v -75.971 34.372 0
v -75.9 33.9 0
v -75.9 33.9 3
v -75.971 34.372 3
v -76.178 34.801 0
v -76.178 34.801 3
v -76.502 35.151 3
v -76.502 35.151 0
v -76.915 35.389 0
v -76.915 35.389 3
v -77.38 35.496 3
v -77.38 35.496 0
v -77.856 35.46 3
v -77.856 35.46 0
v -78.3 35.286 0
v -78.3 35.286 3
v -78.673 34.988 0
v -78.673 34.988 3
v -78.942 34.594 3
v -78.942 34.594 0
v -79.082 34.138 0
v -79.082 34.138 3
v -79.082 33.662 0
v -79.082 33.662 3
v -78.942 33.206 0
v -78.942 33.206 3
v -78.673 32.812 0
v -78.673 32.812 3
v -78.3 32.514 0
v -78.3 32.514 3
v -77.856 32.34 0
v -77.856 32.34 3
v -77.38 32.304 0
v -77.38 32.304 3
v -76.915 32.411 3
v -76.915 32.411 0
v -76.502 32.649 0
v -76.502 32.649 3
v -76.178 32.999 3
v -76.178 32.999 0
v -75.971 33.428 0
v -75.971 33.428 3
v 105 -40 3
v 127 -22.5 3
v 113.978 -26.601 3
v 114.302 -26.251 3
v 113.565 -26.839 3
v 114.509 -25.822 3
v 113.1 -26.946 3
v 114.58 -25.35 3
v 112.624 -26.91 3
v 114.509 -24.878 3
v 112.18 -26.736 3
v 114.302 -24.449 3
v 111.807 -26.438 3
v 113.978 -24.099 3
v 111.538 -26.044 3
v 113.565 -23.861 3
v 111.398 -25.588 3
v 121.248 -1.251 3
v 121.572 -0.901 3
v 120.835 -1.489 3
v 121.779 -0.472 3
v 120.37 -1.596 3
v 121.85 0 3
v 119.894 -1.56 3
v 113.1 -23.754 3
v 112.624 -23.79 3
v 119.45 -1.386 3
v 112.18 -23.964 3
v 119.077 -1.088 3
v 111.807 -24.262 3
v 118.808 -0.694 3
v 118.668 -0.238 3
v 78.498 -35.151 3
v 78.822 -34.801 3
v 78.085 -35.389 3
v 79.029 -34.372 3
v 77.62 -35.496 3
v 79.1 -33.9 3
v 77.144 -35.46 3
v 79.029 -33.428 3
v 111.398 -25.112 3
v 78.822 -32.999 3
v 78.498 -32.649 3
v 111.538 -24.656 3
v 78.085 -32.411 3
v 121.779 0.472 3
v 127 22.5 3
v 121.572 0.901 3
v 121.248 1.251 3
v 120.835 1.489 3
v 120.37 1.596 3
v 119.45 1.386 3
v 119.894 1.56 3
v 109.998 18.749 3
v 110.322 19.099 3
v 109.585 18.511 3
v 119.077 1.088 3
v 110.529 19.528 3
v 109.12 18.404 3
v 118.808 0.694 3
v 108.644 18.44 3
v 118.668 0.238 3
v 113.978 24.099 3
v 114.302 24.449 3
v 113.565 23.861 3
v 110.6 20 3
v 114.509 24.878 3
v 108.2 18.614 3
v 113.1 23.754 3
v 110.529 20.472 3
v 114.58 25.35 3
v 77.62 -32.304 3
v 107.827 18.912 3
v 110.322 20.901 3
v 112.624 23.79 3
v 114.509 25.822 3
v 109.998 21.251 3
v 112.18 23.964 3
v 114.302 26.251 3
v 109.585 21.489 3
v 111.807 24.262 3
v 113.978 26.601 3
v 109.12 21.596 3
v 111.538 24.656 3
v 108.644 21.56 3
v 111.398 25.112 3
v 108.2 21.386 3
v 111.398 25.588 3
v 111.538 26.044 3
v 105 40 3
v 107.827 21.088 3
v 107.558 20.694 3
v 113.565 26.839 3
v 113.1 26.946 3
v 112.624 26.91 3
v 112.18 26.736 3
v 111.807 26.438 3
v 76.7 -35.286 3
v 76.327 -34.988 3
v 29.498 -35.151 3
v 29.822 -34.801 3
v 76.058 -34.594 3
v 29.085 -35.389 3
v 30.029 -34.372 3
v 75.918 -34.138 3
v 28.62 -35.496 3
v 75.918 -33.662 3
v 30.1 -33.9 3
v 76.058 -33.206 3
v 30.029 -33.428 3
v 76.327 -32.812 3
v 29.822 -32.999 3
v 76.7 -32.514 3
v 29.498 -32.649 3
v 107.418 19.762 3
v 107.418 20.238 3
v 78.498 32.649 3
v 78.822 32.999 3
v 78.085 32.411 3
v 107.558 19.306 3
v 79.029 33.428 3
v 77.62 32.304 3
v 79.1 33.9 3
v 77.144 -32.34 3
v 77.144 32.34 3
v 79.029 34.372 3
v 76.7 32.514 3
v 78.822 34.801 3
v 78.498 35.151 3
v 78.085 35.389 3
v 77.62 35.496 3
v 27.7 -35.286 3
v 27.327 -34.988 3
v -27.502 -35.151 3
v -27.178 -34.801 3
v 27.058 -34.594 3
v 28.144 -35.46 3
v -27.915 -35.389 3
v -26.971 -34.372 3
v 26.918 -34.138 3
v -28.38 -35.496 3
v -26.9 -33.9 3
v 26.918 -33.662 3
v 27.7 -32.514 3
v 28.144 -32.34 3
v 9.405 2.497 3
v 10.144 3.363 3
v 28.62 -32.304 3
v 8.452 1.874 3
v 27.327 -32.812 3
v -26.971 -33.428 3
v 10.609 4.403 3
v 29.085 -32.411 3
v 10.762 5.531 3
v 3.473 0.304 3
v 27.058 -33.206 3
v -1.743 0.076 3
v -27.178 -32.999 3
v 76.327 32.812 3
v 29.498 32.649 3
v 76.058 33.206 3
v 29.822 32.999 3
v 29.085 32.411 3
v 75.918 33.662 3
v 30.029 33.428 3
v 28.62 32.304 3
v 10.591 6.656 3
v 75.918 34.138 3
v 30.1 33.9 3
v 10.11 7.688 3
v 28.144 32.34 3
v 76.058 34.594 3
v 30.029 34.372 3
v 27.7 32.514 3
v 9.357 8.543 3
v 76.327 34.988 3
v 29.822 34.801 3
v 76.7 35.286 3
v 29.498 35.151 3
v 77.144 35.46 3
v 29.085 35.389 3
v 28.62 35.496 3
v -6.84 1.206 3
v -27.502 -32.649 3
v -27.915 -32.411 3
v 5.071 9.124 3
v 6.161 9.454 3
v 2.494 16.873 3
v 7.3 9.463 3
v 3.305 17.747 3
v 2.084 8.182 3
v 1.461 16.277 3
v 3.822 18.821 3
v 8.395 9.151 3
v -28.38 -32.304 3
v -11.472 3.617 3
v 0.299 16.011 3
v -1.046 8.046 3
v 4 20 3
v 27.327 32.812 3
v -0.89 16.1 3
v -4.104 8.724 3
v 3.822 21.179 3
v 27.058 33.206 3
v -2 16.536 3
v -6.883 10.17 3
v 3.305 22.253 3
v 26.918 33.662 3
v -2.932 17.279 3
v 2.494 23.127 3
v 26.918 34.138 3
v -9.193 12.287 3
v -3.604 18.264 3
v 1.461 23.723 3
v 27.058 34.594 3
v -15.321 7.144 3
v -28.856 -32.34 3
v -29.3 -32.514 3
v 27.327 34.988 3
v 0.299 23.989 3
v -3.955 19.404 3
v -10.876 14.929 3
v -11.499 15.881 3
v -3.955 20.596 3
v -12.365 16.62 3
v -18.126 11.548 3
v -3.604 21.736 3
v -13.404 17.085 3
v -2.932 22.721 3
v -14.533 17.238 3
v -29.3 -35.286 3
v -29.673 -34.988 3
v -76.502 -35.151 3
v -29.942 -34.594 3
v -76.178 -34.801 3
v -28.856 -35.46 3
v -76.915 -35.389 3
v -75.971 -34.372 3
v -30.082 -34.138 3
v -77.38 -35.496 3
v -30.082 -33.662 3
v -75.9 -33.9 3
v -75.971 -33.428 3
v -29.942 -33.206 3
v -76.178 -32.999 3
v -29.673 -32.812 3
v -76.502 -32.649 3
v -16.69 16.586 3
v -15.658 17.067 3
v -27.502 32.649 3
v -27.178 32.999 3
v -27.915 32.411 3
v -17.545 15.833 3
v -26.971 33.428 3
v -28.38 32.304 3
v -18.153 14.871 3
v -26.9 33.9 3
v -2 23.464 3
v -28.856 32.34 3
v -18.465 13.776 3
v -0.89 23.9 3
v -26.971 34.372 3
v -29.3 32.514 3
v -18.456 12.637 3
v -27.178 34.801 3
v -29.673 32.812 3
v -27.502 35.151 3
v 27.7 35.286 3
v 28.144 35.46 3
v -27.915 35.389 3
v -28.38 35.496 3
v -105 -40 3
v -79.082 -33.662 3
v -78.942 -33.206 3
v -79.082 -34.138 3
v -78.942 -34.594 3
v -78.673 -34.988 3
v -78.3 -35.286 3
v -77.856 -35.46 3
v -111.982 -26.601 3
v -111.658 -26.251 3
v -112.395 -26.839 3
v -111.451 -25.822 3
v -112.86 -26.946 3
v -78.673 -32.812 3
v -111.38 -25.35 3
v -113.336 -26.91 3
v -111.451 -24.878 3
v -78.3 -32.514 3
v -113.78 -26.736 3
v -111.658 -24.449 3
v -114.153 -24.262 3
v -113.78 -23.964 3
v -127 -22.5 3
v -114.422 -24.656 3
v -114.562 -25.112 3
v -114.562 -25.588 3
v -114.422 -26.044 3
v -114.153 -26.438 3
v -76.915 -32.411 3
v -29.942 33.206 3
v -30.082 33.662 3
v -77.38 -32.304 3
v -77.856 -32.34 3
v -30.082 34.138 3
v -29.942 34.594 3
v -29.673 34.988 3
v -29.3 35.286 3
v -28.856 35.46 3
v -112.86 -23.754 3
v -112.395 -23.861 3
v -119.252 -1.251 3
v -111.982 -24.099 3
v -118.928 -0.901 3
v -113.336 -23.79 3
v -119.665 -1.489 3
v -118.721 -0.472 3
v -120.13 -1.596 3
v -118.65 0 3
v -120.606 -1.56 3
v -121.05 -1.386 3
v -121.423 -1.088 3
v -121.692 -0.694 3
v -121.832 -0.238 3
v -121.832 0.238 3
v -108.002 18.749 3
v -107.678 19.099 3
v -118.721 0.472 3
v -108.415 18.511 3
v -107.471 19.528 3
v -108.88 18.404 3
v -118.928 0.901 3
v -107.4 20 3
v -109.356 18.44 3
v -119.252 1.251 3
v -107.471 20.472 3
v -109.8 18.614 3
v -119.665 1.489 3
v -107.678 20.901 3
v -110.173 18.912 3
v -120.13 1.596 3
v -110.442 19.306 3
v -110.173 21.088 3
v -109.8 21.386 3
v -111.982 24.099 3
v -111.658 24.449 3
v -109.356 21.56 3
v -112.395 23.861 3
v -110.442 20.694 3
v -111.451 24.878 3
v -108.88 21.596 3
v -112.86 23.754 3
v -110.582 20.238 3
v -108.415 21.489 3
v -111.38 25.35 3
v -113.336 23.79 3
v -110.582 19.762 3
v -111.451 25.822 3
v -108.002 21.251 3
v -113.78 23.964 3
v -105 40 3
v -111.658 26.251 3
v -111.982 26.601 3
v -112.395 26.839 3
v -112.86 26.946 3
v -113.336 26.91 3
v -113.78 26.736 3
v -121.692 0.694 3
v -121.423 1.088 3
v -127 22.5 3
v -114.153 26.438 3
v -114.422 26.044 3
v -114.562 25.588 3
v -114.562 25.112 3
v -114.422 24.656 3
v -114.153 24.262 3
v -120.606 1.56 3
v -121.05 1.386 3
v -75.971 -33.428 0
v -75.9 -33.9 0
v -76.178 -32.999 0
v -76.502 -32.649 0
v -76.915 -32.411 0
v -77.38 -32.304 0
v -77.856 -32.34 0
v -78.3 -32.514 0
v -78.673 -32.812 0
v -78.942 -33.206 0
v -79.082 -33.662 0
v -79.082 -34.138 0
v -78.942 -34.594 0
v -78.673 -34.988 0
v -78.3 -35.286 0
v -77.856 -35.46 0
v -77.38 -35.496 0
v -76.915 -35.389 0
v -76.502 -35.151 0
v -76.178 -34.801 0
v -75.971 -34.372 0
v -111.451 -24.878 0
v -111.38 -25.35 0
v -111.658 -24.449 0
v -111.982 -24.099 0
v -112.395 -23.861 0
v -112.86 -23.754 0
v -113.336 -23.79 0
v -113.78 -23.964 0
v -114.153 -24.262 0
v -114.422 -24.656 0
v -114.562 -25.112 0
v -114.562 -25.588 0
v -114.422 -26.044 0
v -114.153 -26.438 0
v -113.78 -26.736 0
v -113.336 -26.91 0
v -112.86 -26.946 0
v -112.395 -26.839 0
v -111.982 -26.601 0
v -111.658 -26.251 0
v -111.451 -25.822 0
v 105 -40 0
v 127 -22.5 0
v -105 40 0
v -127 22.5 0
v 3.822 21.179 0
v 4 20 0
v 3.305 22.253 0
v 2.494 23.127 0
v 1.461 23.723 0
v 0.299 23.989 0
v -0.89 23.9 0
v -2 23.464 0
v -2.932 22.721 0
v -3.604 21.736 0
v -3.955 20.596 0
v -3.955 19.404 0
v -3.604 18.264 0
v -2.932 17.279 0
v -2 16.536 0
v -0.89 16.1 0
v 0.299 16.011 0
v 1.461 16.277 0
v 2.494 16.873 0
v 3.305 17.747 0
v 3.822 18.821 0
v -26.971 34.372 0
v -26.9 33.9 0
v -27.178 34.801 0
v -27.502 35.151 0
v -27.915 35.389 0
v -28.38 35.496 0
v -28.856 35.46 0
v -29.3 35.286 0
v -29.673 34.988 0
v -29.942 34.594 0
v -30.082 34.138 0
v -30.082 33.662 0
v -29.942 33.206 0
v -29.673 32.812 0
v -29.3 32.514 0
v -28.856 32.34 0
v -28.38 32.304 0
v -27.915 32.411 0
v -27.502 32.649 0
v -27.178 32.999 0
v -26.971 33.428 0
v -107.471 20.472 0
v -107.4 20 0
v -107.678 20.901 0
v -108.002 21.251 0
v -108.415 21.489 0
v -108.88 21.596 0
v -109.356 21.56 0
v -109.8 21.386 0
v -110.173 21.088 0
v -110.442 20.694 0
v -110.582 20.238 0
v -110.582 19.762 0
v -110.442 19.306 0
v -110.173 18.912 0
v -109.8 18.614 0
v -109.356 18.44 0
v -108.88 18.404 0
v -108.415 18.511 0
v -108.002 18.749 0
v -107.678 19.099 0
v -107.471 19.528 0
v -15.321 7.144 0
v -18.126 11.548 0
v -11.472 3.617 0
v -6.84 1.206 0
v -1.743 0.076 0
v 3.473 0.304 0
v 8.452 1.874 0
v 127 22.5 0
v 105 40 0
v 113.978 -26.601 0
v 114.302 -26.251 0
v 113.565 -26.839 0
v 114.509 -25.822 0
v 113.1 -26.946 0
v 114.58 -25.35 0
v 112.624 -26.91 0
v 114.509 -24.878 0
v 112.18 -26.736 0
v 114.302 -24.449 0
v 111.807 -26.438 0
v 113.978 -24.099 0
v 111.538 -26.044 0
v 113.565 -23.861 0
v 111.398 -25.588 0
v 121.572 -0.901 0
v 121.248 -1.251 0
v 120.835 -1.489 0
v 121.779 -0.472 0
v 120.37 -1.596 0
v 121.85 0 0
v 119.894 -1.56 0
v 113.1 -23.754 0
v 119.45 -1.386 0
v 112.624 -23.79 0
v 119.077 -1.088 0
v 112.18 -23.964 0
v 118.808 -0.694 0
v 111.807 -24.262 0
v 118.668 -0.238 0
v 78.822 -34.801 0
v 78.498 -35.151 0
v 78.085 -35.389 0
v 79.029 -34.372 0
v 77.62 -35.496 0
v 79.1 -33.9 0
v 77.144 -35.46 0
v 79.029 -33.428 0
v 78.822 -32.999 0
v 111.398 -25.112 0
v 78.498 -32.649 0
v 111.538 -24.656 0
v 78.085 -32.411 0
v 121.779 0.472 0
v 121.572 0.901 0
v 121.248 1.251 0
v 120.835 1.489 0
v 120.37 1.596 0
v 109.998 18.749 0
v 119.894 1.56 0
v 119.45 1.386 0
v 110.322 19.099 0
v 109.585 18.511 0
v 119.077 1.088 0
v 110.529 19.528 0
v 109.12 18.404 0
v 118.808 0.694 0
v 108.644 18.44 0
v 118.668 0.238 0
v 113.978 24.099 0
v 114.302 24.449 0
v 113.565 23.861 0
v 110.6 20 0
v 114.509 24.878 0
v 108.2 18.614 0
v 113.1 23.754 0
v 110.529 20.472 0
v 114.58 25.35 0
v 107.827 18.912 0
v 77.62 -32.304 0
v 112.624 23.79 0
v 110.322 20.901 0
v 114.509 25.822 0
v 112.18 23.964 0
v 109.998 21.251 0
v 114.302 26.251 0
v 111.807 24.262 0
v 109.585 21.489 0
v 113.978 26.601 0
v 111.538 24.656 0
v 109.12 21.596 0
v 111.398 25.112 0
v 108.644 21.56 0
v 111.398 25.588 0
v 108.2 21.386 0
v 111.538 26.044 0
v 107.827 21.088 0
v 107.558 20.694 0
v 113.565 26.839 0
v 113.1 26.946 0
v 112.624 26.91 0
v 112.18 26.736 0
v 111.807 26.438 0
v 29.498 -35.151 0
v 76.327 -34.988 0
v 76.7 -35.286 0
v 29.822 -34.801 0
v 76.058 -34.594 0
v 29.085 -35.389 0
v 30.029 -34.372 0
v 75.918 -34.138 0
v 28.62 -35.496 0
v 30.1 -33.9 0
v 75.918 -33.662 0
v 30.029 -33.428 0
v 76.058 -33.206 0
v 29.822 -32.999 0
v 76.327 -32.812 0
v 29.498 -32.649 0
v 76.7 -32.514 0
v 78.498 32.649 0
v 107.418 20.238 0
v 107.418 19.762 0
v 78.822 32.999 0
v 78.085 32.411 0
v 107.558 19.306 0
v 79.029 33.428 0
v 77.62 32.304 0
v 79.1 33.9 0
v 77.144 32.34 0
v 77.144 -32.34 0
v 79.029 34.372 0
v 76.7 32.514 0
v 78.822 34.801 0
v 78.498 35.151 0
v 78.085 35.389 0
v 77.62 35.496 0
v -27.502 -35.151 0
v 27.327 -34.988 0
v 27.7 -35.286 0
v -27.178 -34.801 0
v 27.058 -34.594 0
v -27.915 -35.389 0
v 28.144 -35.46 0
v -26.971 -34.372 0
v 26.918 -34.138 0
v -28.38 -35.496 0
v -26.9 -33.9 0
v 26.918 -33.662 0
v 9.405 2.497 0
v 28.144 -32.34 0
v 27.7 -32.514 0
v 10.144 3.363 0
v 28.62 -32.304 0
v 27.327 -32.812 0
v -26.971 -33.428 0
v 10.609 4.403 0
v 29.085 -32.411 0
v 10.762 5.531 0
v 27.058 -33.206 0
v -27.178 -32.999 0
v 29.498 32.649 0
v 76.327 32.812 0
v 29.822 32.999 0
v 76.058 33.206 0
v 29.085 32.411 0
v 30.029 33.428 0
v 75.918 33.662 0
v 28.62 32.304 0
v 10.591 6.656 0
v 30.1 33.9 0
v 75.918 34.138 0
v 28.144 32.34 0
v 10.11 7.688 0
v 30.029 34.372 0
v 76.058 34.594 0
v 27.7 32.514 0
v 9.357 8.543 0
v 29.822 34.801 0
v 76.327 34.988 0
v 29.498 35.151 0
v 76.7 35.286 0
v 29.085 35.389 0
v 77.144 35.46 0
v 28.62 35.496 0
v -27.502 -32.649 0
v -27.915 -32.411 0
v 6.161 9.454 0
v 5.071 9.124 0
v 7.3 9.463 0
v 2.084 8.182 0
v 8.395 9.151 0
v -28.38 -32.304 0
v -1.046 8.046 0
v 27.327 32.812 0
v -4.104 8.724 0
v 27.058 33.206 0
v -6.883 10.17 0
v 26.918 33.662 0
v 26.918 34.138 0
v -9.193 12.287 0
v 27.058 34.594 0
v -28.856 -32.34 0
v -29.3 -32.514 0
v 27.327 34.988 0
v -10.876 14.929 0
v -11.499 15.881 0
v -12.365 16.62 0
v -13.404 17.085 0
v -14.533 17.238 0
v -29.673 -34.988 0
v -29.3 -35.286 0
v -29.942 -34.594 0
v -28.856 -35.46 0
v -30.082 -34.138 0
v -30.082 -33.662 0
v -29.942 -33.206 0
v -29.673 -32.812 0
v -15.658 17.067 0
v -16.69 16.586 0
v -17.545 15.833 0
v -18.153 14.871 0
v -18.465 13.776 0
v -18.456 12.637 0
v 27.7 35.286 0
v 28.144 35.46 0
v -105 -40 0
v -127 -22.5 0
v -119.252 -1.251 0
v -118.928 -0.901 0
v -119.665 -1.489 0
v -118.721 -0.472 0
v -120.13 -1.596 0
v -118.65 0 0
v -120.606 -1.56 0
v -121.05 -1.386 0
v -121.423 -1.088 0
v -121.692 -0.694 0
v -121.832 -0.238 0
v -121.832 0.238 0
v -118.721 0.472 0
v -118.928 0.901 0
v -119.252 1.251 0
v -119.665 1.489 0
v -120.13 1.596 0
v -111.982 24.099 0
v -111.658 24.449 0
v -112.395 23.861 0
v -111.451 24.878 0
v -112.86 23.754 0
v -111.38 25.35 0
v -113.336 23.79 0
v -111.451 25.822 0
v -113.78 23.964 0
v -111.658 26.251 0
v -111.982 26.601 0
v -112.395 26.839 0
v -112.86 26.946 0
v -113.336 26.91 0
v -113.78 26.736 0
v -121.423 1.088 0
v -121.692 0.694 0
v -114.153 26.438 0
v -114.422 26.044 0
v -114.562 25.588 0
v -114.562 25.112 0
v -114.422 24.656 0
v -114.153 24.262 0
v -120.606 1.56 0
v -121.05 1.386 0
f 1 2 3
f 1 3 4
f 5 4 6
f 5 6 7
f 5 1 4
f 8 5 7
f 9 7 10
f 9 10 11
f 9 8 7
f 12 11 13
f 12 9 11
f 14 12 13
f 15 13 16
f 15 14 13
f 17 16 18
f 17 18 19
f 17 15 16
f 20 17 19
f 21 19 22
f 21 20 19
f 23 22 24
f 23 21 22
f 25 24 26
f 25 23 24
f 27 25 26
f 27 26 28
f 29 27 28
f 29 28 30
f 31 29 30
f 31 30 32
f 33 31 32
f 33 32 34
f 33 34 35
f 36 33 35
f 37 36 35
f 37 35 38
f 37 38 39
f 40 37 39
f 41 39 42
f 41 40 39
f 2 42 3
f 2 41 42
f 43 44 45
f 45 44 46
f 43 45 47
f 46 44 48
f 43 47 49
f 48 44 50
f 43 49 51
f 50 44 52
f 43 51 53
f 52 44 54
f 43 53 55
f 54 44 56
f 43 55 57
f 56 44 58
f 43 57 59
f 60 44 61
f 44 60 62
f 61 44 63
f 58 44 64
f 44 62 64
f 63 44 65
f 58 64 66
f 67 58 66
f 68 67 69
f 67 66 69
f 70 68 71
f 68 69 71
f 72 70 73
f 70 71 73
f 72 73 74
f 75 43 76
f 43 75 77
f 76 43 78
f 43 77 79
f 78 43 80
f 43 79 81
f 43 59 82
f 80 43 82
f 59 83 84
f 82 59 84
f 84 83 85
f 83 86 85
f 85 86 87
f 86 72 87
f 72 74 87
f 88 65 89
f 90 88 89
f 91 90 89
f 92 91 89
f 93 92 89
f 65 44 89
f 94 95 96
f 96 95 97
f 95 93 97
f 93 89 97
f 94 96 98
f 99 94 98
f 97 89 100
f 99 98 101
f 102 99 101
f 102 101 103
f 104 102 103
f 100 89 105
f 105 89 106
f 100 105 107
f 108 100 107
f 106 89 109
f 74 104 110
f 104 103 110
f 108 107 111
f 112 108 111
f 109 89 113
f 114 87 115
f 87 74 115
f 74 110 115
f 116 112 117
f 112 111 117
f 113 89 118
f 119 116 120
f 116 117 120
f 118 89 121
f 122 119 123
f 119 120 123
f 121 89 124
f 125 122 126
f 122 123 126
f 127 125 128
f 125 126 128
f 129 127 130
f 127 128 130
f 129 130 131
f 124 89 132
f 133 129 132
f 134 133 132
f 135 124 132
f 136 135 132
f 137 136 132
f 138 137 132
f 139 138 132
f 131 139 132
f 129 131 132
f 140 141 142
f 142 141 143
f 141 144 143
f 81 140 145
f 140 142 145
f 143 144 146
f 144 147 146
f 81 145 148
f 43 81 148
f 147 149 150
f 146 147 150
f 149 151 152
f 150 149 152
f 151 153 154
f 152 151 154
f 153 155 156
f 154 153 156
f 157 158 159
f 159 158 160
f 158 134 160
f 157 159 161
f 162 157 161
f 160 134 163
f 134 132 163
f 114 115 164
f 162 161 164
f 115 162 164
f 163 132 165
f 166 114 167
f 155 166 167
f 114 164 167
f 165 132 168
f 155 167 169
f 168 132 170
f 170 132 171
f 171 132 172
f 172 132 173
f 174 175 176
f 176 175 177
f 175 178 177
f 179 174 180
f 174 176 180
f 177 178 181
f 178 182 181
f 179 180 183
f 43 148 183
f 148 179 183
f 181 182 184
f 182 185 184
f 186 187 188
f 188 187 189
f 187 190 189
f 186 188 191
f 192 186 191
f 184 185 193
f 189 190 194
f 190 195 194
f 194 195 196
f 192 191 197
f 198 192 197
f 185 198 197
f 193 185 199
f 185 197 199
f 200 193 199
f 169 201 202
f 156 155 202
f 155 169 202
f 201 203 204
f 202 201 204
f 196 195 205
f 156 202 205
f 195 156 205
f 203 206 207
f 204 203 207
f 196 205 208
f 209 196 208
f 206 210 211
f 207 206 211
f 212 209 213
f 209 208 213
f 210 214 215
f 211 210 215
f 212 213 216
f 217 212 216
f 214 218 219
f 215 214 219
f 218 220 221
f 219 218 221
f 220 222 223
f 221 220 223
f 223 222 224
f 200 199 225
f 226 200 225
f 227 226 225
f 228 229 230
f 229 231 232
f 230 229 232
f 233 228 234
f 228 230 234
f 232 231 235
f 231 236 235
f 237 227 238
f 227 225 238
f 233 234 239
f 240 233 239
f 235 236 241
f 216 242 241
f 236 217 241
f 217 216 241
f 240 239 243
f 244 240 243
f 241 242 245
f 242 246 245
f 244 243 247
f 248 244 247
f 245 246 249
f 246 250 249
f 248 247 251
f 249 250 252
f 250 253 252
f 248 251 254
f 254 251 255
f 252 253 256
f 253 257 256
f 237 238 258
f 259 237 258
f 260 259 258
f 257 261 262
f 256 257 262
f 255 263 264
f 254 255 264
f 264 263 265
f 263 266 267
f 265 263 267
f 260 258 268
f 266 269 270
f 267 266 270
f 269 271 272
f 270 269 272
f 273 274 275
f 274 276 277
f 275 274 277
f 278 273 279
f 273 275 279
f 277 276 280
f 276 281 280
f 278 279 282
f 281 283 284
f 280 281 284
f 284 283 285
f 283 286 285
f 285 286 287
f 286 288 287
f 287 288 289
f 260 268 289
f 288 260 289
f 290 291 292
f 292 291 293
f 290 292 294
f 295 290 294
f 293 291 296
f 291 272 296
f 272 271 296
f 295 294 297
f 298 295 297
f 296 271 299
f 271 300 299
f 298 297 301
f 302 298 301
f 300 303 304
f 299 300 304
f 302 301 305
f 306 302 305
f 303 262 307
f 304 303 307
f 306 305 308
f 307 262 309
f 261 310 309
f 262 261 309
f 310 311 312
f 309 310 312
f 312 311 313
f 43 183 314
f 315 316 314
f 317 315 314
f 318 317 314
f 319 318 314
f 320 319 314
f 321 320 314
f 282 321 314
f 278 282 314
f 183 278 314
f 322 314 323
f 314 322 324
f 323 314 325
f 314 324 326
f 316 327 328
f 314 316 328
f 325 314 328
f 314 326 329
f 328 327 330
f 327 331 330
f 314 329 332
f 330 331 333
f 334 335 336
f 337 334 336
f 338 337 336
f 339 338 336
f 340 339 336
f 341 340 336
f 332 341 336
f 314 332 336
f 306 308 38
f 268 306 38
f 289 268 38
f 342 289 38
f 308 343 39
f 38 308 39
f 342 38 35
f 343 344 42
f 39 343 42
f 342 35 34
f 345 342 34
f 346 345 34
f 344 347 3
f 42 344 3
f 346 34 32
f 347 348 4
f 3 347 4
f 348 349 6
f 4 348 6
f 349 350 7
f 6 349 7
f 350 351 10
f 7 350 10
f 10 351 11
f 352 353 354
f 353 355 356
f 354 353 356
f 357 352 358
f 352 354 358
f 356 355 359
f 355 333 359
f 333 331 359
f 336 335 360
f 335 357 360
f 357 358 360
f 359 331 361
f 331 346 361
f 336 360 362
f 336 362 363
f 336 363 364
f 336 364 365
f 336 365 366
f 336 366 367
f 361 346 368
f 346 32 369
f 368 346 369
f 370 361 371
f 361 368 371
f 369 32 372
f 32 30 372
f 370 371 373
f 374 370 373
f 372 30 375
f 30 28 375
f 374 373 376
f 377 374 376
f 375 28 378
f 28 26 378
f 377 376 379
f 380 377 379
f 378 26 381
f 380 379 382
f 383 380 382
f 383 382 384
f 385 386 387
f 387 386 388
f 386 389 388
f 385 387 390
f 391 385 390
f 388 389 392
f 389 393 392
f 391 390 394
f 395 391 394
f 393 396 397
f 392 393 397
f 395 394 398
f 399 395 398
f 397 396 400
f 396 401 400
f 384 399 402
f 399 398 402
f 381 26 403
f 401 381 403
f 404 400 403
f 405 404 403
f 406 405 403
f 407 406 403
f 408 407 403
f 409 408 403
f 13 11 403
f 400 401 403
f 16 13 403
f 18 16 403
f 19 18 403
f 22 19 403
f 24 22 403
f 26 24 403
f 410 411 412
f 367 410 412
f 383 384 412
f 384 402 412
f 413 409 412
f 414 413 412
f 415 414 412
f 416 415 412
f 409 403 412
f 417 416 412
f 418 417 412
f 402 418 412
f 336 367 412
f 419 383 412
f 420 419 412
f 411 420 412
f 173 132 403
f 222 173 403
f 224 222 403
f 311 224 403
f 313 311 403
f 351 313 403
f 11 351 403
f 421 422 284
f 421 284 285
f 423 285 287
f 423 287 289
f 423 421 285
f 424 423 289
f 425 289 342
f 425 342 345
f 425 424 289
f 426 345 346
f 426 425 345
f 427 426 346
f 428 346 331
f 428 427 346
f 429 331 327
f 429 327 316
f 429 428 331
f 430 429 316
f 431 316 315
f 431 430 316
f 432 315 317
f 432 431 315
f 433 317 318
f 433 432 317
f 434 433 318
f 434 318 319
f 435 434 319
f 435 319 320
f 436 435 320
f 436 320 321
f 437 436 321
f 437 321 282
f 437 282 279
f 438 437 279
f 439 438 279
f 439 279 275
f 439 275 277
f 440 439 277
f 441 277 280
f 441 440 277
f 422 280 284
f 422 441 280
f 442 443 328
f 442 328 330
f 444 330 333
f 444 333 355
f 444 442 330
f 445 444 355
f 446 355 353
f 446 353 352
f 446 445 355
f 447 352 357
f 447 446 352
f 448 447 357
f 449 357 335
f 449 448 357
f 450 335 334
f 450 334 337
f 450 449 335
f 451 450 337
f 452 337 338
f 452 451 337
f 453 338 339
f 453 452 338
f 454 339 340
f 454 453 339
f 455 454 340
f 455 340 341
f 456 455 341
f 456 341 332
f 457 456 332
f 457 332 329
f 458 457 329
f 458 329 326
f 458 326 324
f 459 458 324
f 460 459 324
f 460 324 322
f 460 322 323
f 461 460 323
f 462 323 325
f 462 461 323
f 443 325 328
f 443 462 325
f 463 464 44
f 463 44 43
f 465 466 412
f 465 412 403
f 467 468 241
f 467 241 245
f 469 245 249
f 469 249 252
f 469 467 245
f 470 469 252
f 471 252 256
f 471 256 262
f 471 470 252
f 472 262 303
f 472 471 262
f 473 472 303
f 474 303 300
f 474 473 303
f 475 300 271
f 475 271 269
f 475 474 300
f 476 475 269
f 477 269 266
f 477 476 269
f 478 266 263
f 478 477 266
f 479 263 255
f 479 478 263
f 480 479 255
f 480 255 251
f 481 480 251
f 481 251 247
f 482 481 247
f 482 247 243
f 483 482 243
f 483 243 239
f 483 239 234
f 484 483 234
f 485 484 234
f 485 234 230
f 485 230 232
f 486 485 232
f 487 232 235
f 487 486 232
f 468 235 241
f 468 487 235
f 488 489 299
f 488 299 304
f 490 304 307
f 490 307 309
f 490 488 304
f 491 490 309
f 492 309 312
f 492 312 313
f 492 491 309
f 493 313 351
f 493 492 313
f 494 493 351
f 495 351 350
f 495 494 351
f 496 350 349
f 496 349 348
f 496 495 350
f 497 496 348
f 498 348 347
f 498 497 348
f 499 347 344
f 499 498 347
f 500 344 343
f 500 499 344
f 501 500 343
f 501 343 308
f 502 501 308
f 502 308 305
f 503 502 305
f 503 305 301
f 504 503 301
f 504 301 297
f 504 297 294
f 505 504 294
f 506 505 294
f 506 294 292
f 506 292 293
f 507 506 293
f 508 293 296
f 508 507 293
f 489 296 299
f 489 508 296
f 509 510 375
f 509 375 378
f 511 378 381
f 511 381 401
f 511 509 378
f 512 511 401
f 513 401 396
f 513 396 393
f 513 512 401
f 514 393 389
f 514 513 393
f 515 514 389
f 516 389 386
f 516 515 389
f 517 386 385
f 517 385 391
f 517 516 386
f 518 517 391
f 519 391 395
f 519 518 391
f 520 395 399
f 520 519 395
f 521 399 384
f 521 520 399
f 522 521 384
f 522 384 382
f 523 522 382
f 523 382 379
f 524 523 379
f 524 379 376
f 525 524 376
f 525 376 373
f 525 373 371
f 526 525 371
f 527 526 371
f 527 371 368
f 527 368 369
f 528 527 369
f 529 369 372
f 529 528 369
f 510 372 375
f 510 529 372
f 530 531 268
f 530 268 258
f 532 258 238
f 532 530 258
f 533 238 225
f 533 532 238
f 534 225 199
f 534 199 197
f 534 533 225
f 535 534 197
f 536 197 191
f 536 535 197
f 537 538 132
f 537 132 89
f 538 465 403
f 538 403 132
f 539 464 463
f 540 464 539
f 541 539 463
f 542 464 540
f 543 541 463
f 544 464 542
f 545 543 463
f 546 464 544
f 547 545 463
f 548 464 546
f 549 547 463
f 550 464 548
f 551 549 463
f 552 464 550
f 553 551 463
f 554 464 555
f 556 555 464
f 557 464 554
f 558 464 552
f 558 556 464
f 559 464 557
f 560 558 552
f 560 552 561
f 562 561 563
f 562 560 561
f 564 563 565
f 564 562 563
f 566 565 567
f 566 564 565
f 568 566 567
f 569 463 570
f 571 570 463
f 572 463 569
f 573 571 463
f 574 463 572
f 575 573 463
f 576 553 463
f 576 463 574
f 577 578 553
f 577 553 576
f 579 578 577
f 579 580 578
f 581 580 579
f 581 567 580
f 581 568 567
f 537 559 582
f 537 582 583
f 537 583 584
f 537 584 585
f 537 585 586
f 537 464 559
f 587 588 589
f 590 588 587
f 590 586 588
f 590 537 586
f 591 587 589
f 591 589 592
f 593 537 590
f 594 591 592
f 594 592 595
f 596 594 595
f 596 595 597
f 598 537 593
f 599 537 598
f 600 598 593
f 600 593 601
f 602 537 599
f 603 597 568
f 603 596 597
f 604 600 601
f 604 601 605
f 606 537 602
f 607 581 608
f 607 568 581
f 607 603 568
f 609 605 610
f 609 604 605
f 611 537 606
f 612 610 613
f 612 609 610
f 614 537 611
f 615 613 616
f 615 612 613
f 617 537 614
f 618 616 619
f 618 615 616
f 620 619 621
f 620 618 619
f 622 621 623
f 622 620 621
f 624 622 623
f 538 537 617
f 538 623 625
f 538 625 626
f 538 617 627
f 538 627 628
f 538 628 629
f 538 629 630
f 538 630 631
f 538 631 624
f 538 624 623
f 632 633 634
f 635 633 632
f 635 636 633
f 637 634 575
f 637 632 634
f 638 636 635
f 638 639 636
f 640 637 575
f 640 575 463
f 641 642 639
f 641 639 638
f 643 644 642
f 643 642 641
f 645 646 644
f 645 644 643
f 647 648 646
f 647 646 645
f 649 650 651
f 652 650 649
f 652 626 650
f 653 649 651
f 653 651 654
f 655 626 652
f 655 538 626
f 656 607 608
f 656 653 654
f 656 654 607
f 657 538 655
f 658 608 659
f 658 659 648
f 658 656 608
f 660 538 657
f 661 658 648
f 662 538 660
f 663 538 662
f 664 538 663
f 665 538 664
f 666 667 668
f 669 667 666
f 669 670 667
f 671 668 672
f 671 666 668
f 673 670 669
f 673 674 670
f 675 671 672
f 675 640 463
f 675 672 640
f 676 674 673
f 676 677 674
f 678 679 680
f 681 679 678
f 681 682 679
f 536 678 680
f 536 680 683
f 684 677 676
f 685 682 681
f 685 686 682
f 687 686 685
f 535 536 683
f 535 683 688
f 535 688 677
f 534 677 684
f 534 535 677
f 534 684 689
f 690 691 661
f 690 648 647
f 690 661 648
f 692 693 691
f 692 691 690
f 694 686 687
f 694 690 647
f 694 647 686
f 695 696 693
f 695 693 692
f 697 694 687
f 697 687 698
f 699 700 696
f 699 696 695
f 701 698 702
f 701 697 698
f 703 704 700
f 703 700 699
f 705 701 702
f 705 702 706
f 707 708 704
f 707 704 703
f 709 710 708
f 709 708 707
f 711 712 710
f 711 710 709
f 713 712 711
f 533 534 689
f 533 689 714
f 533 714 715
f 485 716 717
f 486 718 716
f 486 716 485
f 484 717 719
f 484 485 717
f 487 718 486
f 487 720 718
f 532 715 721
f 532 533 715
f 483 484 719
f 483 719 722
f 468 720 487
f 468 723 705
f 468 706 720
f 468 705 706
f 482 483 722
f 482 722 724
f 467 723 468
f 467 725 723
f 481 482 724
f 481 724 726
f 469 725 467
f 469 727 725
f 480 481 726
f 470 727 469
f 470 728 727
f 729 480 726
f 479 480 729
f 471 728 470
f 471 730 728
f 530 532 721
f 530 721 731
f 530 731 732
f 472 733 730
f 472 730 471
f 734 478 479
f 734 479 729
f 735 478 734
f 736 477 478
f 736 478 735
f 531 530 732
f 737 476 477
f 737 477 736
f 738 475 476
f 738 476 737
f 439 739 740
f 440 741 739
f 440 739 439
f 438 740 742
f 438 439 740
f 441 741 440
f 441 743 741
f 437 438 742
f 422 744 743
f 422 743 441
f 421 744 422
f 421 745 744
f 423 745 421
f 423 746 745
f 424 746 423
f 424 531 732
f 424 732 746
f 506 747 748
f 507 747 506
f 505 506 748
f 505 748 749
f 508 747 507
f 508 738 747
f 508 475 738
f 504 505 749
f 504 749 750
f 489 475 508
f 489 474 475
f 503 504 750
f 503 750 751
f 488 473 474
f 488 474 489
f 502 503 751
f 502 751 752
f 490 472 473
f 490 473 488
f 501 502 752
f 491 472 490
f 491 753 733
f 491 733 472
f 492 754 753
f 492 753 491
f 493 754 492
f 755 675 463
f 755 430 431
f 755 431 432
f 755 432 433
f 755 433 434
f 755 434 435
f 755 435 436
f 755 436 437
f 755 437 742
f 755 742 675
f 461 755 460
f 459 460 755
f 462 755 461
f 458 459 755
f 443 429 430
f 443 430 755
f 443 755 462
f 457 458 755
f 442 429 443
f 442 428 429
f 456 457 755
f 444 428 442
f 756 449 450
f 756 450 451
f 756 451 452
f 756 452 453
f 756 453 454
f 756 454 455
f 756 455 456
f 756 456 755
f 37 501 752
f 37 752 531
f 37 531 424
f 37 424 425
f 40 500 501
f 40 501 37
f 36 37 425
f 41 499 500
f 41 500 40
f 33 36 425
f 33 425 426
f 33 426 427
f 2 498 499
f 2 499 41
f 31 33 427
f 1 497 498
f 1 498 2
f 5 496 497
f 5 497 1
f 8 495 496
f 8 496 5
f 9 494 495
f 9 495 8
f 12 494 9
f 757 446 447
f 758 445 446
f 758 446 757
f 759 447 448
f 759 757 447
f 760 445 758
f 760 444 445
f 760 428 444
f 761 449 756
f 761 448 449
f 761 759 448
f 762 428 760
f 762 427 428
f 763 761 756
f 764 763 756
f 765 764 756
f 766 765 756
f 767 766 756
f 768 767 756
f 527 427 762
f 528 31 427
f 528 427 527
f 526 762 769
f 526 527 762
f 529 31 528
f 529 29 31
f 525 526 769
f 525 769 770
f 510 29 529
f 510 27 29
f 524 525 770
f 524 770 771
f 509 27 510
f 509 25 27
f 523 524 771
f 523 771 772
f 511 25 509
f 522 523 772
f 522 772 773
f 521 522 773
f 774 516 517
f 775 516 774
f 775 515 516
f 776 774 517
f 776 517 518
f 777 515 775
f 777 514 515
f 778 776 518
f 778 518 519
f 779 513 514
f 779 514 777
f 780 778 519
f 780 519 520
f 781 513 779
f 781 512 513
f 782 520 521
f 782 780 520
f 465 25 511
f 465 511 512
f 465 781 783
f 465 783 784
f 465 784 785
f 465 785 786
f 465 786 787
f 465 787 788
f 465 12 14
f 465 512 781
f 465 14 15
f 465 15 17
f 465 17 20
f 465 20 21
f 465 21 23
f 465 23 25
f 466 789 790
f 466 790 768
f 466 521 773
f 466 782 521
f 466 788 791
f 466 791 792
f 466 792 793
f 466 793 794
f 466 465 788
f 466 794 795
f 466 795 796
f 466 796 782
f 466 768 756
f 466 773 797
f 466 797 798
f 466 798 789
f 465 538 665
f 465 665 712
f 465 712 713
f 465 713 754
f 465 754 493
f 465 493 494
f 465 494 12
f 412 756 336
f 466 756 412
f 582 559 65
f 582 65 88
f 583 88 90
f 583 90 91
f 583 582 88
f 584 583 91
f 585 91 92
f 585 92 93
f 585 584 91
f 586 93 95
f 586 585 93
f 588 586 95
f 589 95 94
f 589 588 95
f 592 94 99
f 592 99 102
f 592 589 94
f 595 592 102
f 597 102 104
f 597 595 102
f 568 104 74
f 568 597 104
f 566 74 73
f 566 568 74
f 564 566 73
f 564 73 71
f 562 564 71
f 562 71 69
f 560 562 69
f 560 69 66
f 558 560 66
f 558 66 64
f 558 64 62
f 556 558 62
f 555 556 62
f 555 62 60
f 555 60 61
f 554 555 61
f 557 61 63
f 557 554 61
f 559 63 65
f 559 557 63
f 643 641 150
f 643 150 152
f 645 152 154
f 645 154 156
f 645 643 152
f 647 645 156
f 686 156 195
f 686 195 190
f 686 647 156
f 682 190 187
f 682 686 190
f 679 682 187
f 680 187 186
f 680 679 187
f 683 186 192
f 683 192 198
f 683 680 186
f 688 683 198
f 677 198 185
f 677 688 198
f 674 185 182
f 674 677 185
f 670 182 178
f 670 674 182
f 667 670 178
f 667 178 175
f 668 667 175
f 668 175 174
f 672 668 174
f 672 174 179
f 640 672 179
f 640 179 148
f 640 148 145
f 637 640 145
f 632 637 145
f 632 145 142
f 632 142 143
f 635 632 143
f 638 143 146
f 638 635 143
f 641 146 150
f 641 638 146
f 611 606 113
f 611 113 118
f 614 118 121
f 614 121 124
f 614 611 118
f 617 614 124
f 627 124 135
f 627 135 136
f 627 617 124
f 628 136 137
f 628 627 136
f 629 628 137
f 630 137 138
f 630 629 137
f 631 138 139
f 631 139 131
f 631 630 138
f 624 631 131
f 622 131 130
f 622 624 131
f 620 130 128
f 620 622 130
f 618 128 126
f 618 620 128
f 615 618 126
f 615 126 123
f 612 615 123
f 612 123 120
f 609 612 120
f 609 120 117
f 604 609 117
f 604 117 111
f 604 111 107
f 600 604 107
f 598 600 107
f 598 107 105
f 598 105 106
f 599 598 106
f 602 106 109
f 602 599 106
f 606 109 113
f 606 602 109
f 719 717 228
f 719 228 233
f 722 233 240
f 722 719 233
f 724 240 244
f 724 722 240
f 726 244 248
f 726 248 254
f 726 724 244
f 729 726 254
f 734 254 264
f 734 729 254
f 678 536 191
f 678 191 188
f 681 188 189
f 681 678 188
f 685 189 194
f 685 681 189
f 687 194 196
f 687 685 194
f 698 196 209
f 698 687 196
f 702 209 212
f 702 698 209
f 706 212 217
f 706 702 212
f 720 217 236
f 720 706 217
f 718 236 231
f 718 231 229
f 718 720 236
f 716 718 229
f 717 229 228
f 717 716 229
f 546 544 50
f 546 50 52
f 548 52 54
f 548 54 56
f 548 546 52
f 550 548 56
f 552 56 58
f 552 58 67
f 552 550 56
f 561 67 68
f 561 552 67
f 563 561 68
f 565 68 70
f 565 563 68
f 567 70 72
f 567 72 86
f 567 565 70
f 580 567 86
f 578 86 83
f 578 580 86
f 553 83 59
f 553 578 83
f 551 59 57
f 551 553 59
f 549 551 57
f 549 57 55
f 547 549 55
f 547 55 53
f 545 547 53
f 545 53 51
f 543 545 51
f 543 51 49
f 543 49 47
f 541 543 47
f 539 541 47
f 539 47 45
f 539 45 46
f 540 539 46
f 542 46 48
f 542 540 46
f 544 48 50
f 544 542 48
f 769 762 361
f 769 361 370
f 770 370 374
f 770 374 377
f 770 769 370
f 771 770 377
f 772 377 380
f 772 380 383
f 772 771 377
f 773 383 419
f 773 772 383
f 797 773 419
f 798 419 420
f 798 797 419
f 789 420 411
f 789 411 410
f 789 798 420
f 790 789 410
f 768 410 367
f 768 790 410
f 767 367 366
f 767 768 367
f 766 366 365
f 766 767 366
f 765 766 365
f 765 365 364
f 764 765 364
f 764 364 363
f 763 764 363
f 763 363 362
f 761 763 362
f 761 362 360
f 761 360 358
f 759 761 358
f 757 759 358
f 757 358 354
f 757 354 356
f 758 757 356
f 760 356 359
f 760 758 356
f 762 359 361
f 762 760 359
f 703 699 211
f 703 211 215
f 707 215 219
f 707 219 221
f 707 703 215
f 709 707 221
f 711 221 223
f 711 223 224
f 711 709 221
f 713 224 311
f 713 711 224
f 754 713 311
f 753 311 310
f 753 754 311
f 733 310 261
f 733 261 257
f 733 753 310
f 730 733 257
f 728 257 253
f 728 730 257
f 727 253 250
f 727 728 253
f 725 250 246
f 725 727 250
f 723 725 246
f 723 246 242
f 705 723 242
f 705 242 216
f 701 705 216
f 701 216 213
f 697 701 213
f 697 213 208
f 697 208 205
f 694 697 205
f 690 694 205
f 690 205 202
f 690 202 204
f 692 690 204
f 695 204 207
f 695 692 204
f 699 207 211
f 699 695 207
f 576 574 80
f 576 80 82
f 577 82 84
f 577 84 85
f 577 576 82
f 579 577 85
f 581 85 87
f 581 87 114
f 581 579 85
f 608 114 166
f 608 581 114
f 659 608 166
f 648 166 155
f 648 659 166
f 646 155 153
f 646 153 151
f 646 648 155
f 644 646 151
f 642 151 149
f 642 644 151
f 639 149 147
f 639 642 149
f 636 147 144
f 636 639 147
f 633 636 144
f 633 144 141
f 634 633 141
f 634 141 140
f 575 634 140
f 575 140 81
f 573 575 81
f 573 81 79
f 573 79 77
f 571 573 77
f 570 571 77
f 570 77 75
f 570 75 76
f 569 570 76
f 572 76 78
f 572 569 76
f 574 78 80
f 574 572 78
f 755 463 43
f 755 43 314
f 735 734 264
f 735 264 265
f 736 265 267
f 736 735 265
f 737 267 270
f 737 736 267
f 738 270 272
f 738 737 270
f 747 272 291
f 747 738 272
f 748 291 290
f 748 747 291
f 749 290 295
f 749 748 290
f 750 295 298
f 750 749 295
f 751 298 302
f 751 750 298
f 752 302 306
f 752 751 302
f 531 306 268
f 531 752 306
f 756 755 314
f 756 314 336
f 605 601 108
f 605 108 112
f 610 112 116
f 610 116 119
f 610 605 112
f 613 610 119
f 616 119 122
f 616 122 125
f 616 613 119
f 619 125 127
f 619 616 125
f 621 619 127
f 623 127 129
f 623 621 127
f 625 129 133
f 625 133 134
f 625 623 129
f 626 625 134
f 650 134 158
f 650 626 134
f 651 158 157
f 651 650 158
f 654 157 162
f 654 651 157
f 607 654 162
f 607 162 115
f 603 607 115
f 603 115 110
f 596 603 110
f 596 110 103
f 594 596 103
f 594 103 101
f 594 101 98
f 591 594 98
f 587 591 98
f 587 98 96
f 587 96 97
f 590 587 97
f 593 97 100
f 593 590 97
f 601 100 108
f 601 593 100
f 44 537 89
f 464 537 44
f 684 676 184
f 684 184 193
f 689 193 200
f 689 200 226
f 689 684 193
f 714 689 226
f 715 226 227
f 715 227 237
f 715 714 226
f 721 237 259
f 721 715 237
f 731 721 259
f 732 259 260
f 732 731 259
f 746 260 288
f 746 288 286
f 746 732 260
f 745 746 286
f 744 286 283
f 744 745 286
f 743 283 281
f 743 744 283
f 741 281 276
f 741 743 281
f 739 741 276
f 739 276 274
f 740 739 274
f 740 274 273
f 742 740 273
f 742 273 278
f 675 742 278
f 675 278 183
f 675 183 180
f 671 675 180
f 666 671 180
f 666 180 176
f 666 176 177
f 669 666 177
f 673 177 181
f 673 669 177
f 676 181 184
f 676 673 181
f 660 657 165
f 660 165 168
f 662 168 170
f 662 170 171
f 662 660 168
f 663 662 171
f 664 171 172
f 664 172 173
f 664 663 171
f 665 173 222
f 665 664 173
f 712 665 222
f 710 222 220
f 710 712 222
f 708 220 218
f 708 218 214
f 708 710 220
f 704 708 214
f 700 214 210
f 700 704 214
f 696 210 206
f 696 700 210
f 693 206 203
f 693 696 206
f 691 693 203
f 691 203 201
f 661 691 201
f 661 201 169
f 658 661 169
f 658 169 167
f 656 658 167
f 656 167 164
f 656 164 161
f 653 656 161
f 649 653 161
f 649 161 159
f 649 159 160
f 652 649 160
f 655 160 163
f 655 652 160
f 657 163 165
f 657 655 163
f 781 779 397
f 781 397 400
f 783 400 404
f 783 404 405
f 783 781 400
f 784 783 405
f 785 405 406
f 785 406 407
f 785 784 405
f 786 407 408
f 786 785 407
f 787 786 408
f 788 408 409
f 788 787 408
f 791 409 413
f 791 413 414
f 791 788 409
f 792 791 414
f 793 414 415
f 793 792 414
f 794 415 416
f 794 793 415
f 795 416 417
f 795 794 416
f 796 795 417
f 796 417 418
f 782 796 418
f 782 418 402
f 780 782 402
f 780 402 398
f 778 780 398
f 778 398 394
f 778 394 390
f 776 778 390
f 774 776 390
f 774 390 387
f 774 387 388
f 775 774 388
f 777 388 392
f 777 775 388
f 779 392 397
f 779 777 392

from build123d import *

# Parameters (mm, degrees)
CROQUIS1_R              = 4
CROQUIS1_R_2            = 1.6
SALIENTE_EXTRUIR1_DEPTH = 3


with BuildPart() as part:
    # Croquis1 → Saliente-Extruir1 (new body)
    with BuildSketch(Plane.XY):
        Polygon((-127, 22.5), (-105, 40), (105, 40), (127, 22.5), (127, -22.5), (105, -40), (-105, -40), (-127, -22.5), align=None)
        with Locations((0, 20)):
            Circle(CROQUIS1_R, mode=Mode.SUBTRACT)
        with Locations((112.98, 25.35)):
            Circle(CROQUIS1_R_2, mode=Mode.SUBTRACT)
        with Locations((120.25, 0)):
            Circle(CROQUIS1_R_2, mode=Mode.SUBTRACT)
        with Locations((112.98, -25.35)):
            Circle(CROQUIS1_R_2, mode=Mode.SUBTRACT)
        with Locations((77.5, -33.9)):
            Circle(CROQUIS1_R_2, mode=Mode.SUBTRACT)
        with Locations((28.5, -33.9)):
            Circle(CROQUIS1_R_2, mode=Mode.SUBTRACT)
        with Locations((-28.5, -33.9)):
            Circle(CROQUIS1_R_2, mode=Mode.SUBTRACT)
        with Locations((-77.5, -33.9)):
            Circle(CROQUIS1_R_2, mode=Mode.SUBTRACT)
        with Locations((-112.98, -25.35)):
            Circle(CROQUIS1_R_2, mode=Mode.SUBTRACT)
        with Locations((-120.25, 0)):
            Circle(CROQUIS1_R_2, mode=Mode.SUBTRACT)
        with Locations((-112.98, 25.35)):
            Circle(CROQUIS1_R_2, mode=Mode.SUBTRACT)
        with Locations((-77.5, 33.9)):
            Circle(CROQUIS1_R_2, mode=Mode.SUBTRACT)
        with Locations((-28.5, 33.9)):
            Circle(CROQUIS1_R_2, mode=Mode.SUBTRACT)
        with Locations((28.5, 33.9)):
            Circle(CROQUIS1_R_2, mode=Mode.SUBTRACT)
        with Locations((77.5, 33.9)):
            Circle(CROQUIS1_R_2, mode=Mode.SUBTRACT)
        with Locations((-109, 20)):
            Circle(CROQUIS1_R_2, mode=Mode.SUBTRACT)
        with Locations((109, 20)):
            Circle(CROQUIS1_R_2, mode=Mode.SUBTRACT)
        with BuildLine():
            ThreePointArc((-18.126155741, 11.547634765), (-6.840402867, 1.206147584), (8.452365235, 1.873844259))
            ThreePointArc((8.452365235, 1.873844259), (10.387123336, 7.189548454), (5.071419141, 9.124306556))
            ThreePointArc((5.071419141, 9.124306556), (-4.10424172, 8.723688551), (-10.875693444, 14.928580859))
            ThreePointArc((-10.875693444, 14.928580859), (-16.19139764, 16.86333896), (-18.126155741, 11.547634765))
        make_face(mode=Mode.SUBTRACT)
    extrude(amount=SALIENTE_EXTRUIR1_DEPTH)


solid = part.part
